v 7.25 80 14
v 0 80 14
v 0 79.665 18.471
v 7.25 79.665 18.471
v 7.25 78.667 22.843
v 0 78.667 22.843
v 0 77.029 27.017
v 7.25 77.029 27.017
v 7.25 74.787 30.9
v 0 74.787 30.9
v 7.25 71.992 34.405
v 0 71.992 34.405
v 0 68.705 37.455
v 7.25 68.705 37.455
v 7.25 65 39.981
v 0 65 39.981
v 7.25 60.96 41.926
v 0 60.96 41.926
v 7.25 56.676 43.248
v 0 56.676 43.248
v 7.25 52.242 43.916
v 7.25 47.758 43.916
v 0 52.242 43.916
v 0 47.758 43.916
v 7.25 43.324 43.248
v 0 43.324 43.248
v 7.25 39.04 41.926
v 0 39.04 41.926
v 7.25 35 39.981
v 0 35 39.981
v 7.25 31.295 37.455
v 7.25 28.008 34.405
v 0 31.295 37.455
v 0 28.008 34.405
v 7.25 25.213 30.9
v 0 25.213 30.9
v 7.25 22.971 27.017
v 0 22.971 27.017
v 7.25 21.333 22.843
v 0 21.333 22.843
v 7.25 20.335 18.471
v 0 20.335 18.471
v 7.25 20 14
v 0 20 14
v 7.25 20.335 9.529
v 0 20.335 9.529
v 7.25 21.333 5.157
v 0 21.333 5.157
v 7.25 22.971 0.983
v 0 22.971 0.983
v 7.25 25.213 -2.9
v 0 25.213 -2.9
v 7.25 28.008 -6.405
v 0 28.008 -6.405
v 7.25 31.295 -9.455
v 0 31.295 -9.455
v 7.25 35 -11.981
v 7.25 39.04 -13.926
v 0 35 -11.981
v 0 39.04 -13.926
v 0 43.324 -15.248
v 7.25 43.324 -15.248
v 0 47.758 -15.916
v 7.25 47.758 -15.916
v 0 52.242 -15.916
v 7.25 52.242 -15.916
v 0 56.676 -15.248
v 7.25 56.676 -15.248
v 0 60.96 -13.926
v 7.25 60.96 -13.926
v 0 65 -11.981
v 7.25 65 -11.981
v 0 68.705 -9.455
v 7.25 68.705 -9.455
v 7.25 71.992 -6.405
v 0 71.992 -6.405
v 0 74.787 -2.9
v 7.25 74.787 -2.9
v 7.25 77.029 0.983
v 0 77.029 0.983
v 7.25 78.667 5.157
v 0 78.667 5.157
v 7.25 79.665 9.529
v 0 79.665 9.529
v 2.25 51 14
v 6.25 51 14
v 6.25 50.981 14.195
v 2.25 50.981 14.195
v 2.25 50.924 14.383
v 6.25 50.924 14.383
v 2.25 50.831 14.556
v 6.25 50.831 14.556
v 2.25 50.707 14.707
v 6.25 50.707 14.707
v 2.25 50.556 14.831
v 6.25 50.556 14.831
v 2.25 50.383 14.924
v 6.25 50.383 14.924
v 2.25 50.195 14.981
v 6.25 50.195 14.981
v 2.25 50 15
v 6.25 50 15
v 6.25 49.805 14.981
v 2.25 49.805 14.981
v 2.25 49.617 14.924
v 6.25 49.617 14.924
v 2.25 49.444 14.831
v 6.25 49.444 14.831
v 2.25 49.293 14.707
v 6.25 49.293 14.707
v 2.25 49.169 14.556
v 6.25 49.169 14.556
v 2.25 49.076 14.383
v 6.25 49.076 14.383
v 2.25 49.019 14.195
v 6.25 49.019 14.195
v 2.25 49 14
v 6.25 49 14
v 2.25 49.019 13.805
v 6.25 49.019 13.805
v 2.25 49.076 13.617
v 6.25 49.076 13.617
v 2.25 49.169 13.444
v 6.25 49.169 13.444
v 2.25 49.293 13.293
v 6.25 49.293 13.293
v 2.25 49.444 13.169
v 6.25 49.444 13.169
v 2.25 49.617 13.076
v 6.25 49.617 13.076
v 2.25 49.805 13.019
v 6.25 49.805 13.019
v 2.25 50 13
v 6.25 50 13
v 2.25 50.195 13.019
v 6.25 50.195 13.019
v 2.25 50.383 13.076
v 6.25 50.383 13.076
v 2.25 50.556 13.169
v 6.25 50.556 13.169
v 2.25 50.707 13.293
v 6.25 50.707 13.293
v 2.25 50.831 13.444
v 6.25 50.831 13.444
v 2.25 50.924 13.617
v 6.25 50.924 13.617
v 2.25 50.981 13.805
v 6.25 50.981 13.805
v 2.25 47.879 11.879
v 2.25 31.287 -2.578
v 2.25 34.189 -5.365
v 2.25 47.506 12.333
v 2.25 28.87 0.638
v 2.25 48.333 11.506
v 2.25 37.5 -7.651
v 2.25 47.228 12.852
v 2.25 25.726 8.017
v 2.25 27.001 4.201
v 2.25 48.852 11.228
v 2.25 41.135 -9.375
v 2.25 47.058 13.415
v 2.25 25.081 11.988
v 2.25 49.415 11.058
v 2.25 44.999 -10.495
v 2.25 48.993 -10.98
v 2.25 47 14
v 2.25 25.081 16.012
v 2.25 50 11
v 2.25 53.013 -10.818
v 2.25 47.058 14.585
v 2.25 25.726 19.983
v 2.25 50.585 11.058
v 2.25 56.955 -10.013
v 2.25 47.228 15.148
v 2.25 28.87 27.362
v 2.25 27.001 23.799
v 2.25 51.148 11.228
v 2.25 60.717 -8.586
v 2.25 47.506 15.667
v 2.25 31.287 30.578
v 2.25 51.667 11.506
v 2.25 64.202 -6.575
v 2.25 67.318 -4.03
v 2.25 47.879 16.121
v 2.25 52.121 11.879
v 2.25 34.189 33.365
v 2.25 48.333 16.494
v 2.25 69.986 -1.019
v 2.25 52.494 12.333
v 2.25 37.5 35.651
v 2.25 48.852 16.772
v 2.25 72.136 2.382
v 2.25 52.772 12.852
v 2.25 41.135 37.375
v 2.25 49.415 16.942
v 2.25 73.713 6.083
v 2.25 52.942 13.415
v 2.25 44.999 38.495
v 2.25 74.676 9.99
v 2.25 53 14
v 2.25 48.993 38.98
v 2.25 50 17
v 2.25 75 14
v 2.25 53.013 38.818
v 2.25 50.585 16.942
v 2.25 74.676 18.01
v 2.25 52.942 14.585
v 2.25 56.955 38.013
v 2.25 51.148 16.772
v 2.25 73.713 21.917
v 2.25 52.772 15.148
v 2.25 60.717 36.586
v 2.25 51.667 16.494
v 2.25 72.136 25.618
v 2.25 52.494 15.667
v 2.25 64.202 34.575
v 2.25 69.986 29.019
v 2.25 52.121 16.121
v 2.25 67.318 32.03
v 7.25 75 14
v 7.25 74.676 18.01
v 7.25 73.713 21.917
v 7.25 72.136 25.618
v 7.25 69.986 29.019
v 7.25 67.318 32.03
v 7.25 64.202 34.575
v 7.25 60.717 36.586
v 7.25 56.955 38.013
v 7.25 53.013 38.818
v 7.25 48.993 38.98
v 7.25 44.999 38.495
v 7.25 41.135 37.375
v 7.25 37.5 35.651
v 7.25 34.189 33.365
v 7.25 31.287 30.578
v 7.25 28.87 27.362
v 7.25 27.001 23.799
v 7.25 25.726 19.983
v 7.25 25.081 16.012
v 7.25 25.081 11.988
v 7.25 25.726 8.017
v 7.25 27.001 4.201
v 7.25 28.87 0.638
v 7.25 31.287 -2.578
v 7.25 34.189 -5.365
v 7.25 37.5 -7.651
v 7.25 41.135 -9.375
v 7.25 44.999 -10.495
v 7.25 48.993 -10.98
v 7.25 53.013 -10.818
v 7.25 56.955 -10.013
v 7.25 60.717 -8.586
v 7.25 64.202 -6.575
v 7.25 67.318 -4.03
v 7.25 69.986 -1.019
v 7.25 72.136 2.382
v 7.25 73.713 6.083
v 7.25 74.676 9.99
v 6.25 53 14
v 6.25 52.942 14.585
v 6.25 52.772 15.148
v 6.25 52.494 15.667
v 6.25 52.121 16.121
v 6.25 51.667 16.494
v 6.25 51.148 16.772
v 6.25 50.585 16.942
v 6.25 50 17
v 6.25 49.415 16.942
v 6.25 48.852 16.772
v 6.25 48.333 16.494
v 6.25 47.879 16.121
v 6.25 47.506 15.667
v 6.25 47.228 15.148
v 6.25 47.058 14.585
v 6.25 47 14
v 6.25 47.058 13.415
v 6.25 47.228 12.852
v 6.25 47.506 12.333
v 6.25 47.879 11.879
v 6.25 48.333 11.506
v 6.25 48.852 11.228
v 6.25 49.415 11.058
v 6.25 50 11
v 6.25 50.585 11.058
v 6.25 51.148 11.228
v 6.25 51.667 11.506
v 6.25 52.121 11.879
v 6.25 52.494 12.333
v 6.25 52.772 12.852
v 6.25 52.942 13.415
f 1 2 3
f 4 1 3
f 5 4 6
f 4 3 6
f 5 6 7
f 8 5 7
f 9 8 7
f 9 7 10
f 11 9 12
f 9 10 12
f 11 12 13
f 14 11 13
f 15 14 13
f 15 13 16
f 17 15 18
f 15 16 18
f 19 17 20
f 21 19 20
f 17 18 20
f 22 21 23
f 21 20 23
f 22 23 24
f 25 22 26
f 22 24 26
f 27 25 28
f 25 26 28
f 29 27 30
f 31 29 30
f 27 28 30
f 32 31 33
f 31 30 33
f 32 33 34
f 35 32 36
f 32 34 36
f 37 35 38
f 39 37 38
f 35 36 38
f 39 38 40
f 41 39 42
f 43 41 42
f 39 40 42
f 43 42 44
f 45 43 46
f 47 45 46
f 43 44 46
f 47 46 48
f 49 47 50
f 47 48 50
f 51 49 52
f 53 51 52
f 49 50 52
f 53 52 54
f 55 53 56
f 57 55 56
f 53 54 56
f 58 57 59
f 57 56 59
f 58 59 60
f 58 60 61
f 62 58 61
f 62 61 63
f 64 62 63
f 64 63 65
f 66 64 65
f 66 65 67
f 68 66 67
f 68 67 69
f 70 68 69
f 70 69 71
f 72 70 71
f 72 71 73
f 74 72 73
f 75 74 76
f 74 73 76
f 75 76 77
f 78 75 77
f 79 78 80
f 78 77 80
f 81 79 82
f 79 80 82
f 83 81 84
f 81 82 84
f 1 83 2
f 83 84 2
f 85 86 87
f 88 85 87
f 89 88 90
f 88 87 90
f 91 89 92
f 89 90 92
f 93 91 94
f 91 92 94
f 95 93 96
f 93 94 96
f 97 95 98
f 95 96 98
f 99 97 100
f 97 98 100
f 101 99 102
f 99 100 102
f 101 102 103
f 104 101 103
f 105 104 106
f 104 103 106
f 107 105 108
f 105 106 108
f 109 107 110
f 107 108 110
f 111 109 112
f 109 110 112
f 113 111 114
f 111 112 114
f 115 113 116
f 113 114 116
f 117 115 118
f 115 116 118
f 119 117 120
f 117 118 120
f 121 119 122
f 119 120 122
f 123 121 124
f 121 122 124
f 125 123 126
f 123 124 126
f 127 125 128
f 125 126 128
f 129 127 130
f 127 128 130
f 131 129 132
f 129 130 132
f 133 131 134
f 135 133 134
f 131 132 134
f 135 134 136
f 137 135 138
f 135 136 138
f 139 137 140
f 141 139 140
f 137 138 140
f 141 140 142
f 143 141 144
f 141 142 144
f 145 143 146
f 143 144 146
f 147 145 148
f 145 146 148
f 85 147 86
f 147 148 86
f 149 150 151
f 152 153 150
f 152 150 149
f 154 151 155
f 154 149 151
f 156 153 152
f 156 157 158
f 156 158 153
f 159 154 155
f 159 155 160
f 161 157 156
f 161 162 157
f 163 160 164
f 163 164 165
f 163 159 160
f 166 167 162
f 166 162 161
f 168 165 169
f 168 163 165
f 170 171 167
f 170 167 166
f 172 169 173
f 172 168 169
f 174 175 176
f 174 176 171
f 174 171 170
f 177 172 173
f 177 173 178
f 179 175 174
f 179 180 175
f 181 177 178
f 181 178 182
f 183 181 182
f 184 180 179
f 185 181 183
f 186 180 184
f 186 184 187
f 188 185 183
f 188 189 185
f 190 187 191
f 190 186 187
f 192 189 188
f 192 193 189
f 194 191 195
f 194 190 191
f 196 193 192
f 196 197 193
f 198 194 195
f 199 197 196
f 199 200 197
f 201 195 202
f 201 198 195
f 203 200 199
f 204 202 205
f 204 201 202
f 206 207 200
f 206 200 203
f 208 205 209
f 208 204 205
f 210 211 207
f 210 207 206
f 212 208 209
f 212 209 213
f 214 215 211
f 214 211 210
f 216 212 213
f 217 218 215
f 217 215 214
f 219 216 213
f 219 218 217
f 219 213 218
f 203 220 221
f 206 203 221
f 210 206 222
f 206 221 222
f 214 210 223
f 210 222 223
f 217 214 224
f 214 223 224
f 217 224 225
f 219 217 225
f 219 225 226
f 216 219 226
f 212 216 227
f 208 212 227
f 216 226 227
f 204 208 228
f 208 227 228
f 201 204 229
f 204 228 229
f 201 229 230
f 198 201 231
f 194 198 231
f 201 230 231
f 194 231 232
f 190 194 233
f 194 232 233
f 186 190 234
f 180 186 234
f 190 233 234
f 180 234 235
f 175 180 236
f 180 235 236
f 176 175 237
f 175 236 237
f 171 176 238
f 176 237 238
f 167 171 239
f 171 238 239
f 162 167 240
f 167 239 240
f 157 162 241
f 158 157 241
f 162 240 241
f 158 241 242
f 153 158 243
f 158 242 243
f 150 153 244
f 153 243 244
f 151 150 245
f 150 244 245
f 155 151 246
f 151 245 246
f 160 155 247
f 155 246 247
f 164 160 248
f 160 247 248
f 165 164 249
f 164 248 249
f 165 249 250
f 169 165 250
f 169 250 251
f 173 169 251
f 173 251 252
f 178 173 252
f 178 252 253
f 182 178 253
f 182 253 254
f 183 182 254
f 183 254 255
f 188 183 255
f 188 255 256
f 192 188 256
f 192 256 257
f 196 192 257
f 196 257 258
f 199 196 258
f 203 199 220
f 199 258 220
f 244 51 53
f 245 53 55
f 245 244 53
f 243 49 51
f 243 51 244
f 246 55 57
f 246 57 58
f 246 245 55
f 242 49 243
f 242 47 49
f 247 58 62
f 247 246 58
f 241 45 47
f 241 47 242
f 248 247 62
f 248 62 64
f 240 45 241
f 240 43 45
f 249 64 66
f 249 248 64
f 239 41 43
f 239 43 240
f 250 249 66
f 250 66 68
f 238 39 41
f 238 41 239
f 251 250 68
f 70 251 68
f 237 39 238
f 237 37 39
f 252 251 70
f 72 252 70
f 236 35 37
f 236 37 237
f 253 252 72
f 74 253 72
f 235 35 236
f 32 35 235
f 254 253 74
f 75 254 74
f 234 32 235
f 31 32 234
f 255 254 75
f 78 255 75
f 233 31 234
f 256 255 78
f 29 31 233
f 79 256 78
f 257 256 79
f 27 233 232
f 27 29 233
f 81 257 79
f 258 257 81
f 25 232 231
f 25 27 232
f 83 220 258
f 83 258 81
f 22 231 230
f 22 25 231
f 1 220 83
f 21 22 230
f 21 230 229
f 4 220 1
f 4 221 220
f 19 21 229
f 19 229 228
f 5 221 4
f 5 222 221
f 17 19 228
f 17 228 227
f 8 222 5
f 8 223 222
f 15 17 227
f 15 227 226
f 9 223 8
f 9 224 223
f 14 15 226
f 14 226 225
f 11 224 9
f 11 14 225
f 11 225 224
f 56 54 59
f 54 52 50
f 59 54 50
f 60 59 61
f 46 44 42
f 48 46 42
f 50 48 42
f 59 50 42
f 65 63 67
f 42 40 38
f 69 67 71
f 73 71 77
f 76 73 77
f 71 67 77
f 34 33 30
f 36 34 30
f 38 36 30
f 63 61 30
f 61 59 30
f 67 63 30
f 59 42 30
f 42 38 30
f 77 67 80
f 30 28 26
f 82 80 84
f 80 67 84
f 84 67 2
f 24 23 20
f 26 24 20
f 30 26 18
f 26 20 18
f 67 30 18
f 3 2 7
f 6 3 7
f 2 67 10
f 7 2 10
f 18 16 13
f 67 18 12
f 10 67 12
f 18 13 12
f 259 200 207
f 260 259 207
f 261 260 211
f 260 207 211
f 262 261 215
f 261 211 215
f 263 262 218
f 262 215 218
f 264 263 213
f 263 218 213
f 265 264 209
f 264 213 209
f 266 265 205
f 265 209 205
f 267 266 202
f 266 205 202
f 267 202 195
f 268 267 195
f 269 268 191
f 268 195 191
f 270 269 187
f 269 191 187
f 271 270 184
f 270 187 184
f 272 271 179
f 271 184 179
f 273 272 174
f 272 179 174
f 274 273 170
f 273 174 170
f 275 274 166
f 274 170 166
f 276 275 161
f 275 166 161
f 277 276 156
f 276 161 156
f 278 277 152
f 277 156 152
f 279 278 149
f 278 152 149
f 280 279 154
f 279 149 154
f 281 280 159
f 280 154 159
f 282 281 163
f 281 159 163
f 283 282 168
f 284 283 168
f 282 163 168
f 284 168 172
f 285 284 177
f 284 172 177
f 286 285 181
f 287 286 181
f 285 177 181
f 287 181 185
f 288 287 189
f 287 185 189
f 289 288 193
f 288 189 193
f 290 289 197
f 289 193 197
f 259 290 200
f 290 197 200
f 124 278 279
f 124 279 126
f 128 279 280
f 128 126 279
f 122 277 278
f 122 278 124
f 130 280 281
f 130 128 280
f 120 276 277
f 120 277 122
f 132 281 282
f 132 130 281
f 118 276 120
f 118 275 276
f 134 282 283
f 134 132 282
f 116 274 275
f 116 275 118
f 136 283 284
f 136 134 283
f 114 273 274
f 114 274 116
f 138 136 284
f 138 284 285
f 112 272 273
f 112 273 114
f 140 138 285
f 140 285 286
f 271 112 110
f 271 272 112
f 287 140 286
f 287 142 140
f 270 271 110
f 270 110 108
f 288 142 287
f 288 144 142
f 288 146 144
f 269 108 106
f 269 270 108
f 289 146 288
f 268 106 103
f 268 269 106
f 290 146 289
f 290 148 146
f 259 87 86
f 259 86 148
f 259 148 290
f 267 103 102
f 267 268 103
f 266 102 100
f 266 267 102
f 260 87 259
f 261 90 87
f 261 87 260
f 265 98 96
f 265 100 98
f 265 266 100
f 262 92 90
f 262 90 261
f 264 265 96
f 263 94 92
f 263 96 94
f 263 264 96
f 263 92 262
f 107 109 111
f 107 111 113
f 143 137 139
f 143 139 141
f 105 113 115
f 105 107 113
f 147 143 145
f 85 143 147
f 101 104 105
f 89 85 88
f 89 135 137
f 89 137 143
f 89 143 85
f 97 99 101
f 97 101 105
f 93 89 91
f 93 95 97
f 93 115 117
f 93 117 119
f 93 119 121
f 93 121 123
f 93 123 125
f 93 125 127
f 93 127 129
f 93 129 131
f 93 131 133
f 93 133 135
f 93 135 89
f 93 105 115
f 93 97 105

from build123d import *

# Parameters (mm, degrees)
SKETCH058_R     = 30
PAD035_DEPTH    = 7.25
SKETCH067_R     = 25
POCKET016_DEPTH = 5
SKETCH068_R     = 3
PAD040_DEPTH    = 4
SKETCH069_R     = 1
POCKET017_DEPTH = 4


with BuildPart() as part:
    # Sketch058 → Pad035 (new body)
    with BuildSketch(Plane.YZ):
        with Locations((50, 14)):
            Circle(SKETCH058_R)
    extrude(amount=PAD035_DEPTH)

    # Sketch067 (on Face3 of Pad035) → Pocket016 (cut)
    with BuildSketch(Plane.YZ.offset(7.25)):
        with Locations((50, 14)):
            Circle(SKETCH067_R)
    extrude(amount=-POCKET016_DEPTH, mode=Mode.SUBTRACT)

    # Sketch068 (on Face5 of Pocket016) → Pad040 (join)
    with BuildSketch(Plane.YZ.offset(2.25)):
        with Locations((50, 14)):
            Circle(SKETCH068_R)
    extrude(amount=PAD040_DEPTH)

    # Sketch069 (on Face7 of Pad040) → Pocket017 (cut)
    with BuildSketch(Plane.YZ.offset(6.25)):
        with Locations((50, 14)):
            Circle(SKETCH069_R)
    extrude(amount=-POCKET017_DEPTH, mode=Mode.SUBTRACT)


solid = part.part
